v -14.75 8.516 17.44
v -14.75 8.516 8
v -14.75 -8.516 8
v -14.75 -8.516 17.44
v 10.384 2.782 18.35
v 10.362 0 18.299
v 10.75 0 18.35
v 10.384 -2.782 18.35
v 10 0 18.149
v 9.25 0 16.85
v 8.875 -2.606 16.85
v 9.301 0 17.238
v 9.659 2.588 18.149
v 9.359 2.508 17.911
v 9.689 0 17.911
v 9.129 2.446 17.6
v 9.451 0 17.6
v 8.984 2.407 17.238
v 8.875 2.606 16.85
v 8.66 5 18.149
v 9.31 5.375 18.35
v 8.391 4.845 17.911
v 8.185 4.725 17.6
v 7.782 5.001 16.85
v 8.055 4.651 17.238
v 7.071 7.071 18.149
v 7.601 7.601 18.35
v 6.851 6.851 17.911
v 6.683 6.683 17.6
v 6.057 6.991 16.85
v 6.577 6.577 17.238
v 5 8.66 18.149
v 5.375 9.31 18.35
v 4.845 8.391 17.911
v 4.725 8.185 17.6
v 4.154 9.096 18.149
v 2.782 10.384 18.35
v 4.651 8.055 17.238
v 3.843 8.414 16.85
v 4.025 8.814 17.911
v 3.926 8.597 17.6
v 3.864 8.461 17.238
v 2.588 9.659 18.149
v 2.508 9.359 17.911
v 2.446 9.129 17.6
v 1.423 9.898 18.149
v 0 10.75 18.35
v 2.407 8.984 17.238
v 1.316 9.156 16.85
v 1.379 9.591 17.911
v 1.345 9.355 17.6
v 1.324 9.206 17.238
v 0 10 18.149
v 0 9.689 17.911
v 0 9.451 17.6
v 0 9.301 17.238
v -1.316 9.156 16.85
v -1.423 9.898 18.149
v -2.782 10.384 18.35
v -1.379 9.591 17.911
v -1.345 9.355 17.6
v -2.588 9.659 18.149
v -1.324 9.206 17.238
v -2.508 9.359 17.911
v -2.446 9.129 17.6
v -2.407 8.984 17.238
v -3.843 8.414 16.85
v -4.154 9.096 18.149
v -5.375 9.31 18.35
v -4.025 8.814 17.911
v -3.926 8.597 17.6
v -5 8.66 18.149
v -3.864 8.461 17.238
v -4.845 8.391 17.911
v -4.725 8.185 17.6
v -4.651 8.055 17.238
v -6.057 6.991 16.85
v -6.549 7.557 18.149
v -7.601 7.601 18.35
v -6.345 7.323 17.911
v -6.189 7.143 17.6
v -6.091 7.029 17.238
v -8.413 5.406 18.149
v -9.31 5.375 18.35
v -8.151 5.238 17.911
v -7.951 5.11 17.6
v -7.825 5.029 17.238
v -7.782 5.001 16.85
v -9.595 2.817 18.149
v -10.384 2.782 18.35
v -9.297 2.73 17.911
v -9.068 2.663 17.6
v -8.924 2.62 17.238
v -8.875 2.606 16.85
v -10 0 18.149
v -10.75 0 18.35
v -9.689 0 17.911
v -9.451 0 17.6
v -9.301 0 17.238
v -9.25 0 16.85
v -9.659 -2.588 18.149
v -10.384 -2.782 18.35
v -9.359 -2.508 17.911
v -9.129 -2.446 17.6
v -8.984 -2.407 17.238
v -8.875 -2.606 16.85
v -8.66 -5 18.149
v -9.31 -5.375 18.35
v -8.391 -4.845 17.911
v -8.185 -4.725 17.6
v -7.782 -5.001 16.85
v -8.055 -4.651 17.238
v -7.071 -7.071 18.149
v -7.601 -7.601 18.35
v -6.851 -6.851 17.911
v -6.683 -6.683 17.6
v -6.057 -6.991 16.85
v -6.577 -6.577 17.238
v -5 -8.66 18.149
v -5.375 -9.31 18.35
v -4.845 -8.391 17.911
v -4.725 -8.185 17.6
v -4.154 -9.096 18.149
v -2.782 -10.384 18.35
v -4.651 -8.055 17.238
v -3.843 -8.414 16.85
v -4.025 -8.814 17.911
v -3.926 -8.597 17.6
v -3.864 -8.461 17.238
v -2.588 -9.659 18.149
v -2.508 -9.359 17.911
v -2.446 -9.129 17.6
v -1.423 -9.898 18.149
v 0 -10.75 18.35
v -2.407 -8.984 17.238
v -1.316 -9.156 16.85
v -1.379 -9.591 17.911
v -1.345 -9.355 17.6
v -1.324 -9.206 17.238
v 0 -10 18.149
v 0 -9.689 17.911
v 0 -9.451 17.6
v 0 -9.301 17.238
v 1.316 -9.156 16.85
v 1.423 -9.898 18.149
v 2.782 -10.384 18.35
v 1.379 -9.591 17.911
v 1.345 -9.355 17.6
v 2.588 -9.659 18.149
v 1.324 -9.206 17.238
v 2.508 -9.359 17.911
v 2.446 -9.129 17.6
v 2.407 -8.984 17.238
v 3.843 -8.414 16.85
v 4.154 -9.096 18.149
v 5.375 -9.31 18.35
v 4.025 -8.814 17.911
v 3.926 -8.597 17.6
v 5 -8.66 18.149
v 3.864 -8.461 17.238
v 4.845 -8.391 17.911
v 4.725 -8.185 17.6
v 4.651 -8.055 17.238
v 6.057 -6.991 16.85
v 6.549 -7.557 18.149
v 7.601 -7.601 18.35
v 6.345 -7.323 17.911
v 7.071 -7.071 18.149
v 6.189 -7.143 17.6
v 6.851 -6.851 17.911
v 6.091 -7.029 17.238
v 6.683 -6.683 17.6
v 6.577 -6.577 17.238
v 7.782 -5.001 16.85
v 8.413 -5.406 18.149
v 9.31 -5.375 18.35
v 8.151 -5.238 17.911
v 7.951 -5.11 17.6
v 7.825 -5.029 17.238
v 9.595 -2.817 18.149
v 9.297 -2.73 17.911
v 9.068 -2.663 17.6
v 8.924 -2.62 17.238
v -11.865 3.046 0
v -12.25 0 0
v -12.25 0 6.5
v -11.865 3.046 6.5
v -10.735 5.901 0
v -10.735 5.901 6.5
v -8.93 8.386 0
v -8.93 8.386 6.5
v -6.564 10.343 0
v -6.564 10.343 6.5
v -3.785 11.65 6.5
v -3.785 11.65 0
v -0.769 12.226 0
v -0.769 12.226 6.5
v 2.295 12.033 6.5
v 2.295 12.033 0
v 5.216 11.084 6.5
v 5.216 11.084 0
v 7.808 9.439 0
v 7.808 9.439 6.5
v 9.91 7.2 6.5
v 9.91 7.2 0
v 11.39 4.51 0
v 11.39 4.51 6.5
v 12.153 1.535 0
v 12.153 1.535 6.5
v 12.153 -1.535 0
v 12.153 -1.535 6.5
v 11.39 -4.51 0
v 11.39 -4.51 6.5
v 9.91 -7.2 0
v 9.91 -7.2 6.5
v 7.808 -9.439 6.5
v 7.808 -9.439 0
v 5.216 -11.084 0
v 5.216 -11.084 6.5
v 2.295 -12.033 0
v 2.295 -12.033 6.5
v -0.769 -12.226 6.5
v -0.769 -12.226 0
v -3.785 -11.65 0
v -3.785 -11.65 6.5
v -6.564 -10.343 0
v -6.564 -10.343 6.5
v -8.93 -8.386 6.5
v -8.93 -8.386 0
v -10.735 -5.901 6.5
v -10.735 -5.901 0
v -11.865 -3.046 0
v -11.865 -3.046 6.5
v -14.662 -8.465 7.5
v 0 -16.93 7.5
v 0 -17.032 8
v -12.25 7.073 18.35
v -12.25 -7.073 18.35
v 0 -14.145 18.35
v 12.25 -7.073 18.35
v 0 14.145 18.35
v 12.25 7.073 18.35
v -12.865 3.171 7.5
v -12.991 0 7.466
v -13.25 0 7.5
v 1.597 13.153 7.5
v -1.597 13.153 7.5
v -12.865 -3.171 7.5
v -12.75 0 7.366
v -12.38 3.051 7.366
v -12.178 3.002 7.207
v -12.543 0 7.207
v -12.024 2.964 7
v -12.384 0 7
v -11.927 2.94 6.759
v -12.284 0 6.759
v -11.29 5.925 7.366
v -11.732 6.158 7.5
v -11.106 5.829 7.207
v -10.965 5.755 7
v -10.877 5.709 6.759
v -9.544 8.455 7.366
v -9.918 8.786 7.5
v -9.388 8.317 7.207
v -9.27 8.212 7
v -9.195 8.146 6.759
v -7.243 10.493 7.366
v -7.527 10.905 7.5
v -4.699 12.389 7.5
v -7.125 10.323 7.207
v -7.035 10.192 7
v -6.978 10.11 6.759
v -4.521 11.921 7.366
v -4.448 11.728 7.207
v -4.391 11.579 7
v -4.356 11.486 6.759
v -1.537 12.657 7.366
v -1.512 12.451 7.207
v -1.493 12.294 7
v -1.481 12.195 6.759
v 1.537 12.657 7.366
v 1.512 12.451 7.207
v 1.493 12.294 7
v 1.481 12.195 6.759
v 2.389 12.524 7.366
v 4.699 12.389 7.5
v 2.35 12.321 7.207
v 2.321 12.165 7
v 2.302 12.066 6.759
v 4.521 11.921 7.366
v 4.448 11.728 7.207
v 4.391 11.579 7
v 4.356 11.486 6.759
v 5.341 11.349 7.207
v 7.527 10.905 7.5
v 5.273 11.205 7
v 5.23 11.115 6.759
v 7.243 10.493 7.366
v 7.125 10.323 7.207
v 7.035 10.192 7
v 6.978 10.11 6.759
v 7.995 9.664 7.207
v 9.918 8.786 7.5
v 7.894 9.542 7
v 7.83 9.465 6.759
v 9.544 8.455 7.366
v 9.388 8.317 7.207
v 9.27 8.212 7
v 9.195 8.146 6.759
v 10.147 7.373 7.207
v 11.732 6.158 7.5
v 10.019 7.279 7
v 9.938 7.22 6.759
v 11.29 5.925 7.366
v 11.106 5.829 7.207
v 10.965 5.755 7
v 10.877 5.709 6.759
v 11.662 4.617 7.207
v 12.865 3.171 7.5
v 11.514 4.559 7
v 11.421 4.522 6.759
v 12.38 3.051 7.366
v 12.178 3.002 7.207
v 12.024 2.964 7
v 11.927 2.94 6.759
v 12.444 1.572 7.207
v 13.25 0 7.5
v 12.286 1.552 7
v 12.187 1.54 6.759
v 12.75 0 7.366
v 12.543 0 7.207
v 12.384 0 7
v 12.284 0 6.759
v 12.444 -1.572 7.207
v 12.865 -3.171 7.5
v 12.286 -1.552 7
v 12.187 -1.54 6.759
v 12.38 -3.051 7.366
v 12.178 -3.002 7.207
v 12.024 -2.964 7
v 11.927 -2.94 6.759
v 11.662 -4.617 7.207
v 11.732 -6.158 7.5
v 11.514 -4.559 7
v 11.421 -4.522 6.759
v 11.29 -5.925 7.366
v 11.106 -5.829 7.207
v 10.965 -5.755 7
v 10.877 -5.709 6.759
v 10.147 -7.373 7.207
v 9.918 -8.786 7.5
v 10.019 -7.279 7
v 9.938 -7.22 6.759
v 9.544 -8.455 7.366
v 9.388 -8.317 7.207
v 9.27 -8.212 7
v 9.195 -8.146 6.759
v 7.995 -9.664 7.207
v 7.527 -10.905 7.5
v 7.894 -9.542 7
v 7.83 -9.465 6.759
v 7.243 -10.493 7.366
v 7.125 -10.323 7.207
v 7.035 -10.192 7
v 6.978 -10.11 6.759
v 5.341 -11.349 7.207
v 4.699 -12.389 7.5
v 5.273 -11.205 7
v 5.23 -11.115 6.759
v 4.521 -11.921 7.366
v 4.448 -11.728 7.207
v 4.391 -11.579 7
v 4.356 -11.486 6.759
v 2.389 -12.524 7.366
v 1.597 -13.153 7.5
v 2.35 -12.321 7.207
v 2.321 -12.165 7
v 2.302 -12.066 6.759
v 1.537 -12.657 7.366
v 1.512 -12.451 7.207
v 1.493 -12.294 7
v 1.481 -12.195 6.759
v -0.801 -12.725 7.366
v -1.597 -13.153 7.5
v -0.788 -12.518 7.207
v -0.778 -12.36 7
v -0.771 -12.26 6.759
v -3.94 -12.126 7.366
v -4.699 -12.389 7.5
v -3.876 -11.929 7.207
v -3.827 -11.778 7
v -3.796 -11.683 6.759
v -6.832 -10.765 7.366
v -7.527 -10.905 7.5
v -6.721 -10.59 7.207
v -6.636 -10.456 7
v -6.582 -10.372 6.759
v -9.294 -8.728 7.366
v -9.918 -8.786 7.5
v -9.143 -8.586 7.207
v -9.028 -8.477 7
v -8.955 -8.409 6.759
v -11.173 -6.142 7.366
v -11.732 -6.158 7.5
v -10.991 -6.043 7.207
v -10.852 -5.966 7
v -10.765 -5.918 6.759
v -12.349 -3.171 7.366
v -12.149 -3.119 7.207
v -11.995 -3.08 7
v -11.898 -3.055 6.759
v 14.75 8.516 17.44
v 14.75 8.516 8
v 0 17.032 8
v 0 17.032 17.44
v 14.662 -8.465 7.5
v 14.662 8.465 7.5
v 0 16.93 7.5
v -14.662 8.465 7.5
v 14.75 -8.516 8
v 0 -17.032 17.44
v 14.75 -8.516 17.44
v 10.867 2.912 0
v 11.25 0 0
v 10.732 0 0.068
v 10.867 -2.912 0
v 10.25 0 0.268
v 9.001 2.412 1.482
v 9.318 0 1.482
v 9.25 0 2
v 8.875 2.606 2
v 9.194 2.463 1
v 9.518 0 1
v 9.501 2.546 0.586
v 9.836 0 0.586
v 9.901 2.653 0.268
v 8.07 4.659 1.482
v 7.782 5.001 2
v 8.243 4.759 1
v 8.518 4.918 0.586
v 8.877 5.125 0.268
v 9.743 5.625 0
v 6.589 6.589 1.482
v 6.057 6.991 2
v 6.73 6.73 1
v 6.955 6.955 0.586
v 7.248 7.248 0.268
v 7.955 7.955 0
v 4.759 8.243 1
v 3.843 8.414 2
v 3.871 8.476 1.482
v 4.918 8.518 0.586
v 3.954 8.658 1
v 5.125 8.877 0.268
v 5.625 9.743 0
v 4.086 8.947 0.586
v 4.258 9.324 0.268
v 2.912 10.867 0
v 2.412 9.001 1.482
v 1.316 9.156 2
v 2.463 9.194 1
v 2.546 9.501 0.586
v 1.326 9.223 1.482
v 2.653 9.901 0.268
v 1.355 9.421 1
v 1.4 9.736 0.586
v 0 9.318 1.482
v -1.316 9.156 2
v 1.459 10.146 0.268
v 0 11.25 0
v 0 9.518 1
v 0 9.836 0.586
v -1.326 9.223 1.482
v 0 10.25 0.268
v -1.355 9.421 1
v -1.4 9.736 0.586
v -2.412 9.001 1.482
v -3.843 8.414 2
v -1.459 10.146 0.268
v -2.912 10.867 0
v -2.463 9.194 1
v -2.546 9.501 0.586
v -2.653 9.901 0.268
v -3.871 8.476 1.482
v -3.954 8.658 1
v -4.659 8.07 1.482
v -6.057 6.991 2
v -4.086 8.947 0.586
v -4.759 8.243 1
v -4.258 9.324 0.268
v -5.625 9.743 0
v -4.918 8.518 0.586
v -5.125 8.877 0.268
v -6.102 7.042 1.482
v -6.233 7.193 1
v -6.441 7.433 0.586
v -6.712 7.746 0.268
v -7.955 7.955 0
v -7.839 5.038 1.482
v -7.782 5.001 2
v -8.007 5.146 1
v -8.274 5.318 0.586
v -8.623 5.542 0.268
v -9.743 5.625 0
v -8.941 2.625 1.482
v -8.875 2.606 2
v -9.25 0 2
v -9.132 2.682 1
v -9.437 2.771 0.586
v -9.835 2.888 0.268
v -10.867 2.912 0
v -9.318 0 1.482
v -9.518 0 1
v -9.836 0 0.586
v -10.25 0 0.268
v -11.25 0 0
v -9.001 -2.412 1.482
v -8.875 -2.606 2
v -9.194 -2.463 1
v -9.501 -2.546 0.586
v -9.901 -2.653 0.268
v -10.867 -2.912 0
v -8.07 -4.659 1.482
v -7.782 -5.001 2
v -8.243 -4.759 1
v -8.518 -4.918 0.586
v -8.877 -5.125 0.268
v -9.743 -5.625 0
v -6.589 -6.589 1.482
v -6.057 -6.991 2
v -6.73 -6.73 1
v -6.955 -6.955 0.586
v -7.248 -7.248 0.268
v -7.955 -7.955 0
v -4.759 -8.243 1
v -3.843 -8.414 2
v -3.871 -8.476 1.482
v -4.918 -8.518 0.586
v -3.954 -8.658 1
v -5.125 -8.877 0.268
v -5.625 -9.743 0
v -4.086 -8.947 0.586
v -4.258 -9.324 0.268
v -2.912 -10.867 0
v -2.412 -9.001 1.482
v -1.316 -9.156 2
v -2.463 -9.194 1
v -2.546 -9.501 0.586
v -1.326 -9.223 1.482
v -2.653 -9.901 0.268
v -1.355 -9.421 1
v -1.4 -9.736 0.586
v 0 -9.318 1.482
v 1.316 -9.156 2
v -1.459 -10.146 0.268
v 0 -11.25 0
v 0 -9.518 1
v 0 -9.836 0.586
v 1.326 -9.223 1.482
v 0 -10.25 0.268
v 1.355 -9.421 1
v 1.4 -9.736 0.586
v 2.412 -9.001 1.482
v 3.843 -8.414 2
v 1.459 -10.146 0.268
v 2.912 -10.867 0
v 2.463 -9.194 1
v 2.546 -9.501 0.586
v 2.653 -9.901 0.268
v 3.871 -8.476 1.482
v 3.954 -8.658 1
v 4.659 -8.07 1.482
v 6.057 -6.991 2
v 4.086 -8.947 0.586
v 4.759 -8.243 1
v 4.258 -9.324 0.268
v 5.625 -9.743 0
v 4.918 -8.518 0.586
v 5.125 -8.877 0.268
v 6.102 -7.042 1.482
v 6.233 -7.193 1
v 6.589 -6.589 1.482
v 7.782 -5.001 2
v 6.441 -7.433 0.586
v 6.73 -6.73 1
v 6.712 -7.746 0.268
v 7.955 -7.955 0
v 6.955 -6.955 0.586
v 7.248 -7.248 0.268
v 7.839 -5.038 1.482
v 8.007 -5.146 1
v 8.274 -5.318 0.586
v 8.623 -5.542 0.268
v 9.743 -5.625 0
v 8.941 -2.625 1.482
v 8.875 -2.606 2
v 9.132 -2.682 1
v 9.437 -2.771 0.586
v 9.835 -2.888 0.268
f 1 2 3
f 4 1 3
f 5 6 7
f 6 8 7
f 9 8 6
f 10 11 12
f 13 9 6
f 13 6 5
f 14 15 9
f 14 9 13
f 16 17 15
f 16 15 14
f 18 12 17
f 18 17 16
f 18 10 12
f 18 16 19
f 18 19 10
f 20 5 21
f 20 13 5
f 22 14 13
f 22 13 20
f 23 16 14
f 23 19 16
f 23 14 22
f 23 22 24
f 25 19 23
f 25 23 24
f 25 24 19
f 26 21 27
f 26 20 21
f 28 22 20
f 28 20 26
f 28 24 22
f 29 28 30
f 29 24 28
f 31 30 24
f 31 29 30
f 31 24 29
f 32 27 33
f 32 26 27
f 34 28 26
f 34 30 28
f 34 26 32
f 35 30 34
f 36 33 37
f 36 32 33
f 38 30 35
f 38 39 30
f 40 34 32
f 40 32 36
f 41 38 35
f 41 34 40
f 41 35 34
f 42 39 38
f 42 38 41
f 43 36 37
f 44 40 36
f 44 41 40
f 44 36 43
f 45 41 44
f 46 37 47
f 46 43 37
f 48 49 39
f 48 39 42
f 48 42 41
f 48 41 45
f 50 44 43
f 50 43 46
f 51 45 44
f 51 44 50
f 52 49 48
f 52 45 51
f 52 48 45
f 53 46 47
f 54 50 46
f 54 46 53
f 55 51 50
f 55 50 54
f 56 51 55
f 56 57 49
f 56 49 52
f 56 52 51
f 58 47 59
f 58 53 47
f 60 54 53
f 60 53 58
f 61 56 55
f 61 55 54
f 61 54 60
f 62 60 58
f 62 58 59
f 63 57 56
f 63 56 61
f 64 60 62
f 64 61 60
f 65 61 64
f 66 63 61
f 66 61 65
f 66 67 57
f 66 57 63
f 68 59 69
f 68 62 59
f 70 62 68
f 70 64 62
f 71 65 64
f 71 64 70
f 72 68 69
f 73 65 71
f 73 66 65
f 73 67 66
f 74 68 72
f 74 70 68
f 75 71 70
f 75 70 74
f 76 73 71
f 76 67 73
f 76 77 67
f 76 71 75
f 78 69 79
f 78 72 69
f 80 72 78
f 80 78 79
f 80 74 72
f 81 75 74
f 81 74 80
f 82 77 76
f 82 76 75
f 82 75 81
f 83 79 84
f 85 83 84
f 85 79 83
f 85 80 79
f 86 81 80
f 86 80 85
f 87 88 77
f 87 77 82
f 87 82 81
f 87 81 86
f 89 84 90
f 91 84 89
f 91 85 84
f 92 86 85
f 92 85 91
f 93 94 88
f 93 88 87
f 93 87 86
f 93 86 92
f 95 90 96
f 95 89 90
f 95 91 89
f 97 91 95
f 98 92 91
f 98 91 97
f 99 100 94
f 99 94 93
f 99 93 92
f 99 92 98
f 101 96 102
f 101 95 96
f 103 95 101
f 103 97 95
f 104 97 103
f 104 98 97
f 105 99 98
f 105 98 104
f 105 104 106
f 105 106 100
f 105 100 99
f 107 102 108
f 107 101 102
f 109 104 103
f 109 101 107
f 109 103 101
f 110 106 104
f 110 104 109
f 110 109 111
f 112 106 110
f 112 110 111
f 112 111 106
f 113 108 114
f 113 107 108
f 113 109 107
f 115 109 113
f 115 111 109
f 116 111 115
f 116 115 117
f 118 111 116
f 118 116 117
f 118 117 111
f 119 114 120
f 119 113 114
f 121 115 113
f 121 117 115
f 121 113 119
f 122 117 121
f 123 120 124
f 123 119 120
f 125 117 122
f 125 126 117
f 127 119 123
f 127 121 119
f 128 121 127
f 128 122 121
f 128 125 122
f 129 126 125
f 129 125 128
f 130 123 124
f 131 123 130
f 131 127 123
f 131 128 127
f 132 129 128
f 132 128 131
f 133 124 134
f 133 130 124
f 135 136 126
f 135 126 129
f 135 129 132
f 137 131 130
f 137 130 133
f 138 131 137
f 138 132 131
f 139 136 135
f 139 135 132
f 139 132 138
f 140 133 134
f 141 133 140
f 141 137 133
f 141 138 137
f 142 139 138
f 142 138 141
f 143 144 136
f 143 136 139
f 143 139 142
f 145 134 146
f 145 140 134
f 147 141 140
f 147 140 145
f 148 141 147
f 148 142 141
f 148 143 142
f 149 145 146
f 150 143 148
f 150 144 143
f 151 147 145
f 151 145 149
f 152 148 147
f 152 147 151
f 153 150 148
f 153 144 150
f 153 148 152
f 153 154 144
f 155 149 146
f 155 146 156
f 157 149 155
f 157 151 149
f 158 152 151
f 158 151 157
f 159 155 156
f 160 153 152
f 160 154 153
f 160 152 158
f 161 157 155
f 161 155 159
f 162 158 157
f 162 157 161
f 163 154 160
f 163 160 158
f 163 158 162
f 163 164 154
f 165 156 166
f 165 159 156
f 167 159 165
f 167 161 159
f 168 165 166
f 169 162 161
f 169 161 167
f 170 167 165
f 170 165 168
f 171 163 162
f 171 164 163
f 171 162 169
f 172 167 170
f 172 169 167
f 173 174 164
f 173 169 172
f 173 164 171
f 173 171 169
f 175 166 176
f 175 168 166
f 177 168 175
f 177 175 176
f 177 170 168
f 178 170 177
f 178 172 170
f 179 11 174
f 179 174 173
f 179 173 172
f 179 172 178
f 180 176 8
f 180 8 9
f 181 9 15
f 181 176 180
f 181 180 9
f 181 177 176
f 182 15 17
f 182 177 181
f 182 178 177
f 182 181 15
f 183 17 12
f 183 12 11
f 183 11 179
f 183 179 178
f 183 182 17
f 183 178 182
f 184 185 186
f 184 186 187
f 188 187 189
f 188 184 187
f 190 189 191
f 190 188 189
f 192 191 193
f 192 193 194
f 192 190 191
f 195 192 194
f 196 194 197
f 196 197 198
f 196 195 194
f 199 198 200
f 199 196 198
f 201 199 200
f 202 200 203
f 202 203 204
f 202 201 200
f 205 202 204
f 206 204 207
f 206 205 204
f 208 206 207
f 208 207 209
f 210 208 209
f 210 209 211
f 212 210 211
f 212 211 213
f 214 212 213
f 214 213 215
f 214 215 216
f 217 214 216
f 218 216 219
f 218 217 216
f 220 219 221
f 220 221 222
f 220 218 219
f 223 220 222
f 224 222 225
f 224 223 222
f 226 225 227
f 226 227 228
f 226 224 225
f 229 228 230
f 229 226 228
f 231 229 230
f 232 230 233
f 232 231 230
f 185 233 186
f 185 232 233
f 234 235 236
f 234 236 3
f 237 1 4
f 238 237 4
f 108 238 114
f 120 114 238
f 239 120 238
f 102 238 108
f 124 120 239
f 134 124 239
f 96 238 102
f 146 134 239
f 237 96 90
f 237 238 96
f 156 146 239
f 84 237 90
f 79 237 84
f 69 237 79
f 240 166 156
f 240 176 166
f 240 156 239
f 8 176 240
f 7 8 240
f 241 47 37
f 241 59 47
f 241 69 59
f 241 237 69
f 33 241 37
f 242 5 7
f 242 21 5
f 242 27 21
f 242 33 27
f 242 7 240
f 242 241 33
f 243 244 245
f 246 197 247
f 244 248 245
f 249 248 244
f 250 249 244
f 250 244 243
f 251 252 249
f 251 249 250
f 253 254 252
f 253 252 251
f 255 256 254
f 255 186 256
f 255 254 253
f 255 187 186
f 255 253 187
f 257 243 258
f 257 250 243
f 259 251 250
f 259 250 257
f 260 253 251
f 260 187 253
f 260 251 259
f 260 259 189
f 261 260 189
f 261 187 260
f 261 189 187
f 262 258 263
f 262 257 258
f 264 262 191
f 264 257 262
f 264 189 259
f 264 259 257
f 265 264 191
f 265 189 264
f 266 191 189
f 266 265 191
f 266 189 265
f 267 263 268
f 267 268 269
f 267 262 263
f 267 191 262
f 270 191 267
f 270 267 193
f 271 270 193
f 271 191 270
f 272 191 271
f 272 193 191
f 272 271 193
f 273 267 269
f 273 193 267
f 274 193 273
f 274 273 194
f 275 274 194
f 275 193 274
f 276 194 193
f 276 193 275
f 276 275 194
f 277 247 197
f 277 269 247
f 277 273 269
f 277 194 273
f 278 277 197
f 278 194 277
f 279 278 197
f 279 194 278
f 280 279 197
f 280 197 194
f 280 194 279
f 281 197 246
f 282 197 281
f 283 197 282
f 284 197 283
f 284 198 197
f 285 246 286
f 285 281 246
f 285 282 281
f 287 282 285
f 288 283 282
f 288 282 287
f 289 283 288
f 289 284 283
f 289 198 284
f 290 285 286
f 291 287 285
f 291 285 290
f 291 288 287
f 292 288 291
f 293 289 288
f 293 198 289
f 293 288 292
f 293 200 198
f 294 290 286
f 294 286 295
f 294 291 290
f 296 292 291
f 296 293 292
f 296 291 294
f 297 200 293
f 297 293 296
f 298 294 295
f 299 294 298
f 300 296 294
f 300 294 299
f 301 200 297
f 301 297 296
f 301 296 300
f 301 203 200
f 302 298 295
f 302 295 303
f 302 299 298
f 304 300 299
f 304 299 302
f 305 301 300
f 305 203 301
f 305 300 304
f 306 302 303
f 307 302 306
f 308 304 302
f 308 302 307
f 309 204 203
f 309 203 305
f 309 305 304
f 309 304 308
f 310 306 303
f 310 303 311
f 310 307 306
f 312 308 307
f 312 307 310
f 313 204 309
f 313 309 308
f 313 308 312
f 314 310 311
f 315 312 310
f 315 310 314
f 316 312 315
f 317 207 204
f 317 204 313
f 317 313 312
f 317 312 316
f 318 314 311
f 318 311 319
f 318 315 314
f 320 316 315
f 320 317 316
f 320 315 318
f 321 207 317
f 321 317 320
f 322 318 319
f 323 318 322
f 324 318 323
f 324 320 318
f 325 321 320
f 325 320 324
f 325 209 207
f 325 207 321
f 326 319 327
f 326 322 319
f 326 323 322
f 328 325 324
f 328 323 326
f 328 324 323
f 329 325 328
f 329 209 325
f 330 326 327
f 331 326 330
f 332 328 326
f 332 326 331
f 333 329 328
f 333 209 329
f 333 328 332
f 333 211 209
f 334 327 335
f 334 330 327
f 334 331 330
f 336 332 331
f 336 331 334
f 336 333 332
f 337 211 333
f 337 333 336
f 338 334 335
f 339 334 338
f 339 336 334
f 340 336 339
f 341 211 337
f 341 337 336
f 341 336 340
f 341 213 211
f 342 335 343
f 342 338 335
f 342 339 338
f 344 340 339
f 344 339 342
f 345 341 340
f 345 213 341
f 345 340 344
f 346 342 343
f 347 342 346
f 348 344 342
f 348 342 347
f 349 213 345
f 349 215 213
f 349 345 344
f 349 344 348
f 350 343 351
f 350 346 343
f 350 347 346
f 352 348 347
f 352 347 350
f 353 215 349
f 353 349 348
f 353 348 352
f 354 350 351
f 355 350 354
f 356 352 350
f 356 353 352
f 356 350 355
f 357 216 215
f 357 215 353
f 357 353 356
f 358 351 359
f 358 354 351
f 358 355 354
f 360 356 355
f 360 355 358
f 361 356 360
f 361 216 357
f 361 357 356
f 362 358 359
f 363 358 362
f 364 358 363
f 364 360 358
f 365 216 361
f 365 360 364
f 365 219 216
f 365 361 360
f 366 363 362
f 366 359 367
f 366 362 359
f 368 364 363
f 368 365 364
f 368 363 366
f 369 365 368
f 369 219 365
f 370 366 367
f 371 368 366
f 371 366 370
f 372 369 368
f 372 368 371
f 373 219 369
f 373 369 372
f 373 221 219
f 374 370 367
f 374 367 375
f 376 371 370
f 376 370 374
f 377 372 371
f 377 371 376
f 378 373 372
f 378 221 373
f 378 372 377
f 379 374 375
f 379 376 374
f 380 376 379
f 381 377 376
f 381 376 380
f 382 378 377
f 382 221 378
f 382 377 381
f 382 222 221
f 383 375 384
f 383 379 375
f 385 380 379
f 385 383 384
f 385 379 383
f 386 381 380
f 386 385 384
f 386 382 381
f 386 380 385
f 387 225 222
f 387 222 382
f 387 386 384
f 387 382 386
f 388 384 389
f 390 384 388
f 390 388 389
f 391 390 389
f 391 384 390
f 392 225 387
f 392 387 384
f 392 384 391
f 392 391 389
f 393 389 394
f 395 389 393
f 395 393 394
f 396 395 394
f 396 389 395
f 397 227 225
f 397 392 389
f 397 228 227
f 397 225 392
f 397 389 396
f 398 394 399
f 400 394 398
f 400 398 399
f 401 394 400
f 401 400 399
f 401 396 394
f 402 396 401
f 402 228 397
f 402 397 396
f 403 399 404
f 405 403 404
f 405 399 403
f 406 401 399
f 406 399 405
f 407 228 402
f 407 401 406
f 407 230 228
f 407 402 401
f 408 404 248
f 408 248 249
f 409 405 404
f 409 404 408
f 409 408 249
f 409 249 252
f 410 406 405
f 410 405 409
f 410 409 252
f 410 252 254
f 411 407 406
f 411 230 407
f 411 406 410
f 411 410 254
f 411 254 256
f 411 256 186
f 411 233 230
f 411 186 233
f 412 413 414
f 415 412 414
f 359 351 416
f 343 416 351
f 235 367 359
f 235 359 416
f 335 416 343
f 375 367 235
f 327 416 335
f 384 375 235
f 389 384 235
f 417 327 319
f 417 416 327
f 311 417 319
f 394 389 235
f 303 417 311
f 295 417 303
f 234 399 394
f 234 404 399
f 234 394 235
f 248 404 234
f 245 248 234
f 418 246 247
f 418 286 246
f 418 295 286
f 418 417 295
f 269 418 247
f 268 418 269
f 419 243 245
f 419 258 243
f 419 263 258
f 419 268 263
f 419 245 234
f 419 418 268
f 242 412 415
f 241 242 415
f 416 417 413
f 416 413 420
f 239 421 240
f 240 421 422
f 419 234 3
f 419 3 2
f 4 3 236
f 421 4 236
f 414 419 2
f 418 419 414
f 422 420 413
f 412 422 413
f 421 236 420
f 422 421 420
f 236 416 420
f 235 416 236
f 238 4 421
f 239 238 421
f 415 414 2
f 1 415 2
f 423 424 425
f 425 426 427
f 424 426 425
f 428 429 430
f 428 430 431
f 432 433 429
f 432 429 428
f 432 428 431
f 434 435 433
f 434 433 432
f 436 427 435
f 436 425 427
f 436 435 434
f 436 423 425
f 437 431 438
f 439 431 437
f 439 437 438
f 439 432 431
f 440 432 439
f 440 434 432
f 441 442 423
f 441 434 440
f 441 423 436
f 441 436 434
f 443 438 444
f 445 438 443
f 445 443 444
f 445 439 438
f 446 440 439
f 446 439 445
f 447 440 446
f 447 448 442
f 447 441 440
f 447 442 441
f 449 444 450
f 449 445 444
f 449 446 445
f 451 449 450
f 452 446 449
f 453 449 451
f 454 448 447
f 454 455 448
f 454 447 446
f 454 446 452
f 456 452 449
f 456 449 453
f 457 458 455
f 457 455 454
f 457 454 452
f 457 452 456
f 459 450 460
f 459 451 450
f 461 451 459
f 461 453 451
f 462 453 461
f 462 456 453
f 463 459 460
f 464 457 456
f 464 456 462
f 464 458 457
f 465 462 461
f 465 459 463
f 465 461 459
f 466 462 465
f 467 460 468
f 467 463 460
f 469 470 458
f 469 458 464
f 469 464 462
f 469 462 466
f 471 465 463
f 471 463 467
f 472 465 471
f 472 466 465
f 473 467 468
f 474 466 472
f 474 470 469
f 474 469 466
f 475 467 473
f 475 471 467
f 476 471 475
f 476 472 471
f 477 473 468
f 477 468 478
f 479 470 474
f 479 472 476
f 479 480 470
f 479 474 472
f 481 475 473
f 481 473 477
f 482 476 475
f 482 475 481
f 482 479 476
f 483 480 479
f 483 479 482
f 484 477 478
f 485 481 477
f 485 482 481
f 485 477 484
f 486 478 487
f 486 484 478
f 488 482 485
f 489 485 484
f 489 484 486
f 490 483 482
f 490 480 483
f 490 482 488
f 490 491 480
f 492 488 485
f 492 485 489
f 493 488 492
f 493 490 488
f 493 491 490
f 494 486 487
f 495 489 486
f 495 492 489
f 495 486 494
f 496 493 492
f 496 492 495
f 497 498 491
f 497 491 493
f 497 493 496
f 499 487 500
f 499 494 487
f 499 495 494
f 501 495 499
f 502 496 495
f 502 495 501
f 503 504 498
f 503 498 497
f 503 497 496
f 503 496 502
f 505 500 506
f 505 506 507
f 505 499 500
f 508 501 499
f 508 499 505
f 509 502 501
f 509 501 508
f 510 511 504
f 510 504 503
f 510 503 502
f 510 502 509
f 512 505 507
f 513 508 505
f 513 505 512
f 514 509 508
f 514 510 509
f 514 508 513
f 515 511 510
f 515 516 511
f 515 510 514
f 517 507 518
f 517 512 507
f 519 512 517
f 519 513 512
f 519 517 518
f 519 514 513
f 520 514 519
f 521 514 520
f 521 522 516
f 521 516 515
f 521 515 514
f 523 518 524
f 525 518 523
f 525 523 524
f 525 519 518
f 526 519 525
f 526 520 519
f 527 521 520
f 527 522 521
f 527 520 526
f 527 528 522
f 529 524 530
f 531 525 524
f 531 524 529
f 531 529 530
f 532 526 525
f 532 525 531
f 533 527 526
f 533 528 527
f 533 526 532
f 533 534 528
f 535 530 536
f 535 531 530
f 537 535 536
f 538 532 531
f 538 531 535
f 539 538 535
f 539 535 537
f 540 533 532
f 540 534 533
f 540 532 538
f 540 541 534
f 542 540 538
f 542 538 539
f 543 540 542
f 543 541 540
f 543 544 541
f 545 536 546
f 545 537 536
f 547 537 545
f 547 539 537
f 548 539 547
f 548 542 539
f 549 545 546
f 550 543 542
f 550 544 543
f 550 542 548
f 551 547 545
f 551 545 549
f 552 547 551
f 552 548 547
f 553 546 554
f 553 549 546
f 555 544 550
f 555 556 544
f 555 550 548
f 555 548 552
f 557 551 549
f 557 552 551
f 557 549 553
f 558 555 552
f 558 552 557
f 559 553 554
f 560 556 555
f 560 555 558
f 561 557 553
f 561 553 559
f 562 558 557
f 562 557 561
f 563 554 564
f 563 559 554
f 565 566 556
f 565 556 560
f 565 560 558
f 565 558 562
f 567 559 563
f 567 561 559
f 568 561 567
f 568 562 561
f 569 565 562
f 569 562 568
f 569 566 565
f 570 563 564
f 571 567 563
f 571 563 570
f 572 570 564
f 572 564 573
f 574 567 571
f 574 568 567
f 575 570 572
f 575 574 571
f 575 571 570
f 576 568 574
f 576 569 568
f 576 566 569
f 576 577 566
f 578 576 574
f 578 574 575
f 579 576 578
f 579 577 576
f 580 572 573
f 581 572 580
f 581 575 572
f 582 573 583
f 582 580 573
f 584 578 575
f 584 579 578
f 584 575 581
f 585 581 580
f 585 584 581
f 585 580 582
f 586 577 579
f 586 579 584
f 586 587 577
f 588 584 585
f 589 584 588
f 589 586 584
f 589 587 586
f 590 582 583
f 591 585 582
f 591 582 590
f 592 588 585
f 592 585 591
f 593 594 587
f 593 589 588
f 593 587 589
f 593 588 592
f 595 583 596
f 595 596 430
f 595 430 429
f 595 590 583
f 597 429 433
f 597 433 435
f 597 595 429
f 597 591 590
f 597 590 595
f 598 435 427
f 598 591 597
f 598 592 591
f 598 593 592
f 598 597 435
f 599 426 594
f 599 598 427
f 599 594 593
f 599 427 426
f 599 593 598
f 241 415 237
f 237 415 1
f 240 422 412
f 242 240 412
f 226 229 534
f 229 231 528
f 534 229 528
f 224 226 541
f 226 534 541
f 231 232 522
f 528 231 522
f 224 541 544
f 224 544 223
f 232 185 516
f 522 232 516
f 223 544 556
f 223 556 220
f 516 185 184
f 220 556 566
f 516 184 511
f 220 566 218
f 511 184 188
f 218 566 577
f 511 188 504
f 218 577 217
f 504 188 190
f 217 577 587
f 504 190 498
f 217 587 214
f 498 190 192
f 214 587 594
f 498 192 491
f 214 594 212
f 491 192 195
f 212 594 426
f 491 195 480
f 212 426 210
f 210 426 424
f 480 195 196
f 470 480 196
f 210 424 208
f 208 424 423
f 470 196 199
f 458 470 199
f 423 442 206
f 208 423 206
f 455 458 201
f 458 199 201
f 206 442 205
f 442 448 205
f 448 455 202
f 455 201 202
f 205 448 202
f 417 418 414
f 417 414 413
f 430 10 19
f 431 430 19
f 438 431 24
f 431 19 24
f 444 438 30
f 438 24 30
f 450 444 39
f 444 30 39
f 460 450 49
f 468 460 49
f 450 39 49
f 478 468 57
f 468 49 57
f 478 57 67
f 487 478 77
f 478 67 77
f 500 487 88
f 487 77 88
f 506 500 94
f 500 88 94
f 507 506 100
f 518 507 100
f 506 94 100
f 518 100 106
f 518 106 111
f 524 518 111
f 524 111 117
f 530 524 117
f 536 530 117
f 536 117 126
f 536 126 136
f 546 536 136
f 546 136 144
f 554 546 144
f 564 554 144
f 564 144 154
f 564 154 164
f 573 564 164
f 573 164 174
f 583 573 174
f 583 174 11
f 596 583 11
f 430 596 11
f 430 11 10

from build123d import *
from OCP.BRepFilletAPI import BRepFilletAPI_MakeChamfer

# Parameters (mm, degrees)
RESSALTO_EXTRUS_O1_DEPTH = 18.35
ESBO_O2_R                = 9.25
CORTE_EXTRUS_O1_DEPTH    = 30.058016679
ESBO_O3_R                = 19.09752109
ESBO_O3_R_2              = 12.25
CORTE_EXTRUS_O2_DEPTH    = 7.5
FILETE1_R                = 2
CHANFRO1_SIZE            = 0.5
CHANFRO1_SIZE2           = 0.08816349
FILETE2_R                = 1
CHANFRO3_SIZE            = 2.5
CHANFRO3_SIZE2           = 0.909925586
FILETE3_R                = 1.5


with BuildPart() as part:
    # Esboço1 → Ressalto-extrusão1 (new body)
    with BuildSketch(Plane.XY):
        Polygon((0, -17.031832941), (14.75, -8.515916471), (14.75, 8.515916471), (0, 17.031832941), (-14.75, 8.515916471), (-14.75, -8.515916471), align=None)
    extrude(amount=RESSALTO_EXTRUS_O1_DEPTH)

    # Esboço2 → Corte-extrusão1 (cut, through all)
    with BuildSketch(Plane.XY.offset(18.35)):
        Circle(ESBO_O2_R)
    extrude(amount=-CORTE_EXTRUS_O1_DEPTH, mode=Mode.SUBTRACT)

    # Esboço3 → Corte-extrusão2 (cut)
    with BuildSketch(Plane(origin=(0, 0, 0), x_dir=(-1, 0, 0), z_dir=(0, 0, -1))):
        Circle(ESBO_O3_R)
        Circle(ESBO_O3_R_2, mode=Mode.SUBTRACT)
    extrude(amount=-CORTE_EXTRUS_O2_DEPTH, mode=Mode.SUBTRACT)

    # Filete1
    filete1_edges = [part.edges().sort_by_distance(p)[0] for p in [
        (-9.25, 0, 0),
    ]]
    fillet(filete1_edges, radius=FILETE1_R)

    # Chanfro1: one chamfer whose edges measure the first distance from different faces: ONE call of the kernel's chamfer builder (chamfer() names one face for all edges)
    chanfro1_edges_1 = [part.edges().sort_by_distance(p)[0] for p in [
        (-14.75, 0, 7.5),
    ]]
    chanfro1_side_1 = [part.faces().sort_by_distance(p)[0] for p in [
        (-14.75, 0, 12.925),
    ]]
    chanfro1_edges_2 = [part.edges().sort_by_distance(p)[0] for p in [
        (7.375, -12.773874706, 7.5),
    ]]
    chanfro1_side_2 = [part.faces().sort_by_distance(p)[0] for p in [
        (7.375, -12.773874706, 12.925),
    ]]
    chanfro1_edges_3 = [part.edges().sort_by_distance(p)[0] for p in [
        (-7.375, -12.773874706, 7.5),
    ]]
    chanfro1_side_3 = [part.faces().sort_by_distance(p)[0] for p in [
        (-7.375, -12.773874706, 12.925),
    ]]
    chanfro1_edges_4 = [part.edges().sort_by_distance(p)[0] for p in [
        (-7.375, 12.773874706, 7.5),
    ]]
    chanfro1_side_4 = [part.faces().sort_by_distance(p)[0] for p in [
        (-7.375, 12.773874706, 12.925),
    ]]
    chanfro1_edges_5 = [part.edges().sort_by_distance(p)[0] for p in [
        (7.375, 12.773874706, 7.5),
    ]]
    chanfro1_side_5 = [part.faces().sort_by_distance(p)[0] for p in [
        (7.375, 12.773874706, 12.925),
    ]]
    chanfro1_edges_6 = [part.edges().sort_by_distance(p)[0] for p in [
        (14.75, 0, 7.5),
    ]]
    chanfro1_side_6 = [part.faces().sort_by_distance(p)[0] for p in [
        (14.75, 0, 12.925),
    ]]
    chanfro1 = BRepFilletAPI_MakeChamfer(part.part.solid().wrapped)
    for e in chanfro1_edges_1:
        chanfro1.Add(CHANFRO1_SIZE, CHANFRO1_SIZE2, e.wrapped, chanfro1_side_1[0].wrapped)  # the first distance lies on this face
    for e in chanfro1_edges_2:
        chanfro1.Add(CHANFRO1_SIZE, CHANFRO1_SIZE2, e.wrapped, chanfro1_side_2[0].wrapped)  # the first distance lies on this face
    for e in chanfro1_edges_3:
        chanfro1.Add(CHANFRO1_SIZE, CHANFRO1_SIZE2, e.wrapped, chanfro1_side_3[0].wrapped)  # the first distance lies on this face
    for e in chanfro1_edges_4:
        chanfro1.Add(CHANFRO1_SIZE, CHANFRO1_SIZE2, e.wrapped, chanfro1_side_4[0].wrapped)  # the first distance lies on this face
    for e in chanfro1_edges_5:
        chanfro1.Add(CHANFRO1_SIZE, CHANFRO1_SIZE2, e.wrapped, chanfro1_side_5[0].wrapped)  # the first distance lies on this face
    for e in chanfro1_edges_6:
        chanfro1.Add(CHANFRO1_SIZE, CHANFRO1_SIZE2, e.wrapped, chanfro1_side_6[0].wrapped)  # the first distance lies on this face
    add(Compound.cast(chanfro1.Shape()), mode=Mode.REPLACE)

    # Filete2
    filete2_edges = [part.edges().sort_by_distance(p)[0] for p in [
        (12.25, 0, 7.5),
    ]]
    fillet(filete2_edges, radius=FILETE2_R)

    # Chanfro3
    chanfro3_edges = [part.edges().sort_by_distance(p)[0] for p in [
        (14.75, 0, 18.35),
        (7.375, 12.773874706, 18.35),
        (-7.375, 12.773874706, 18.35),
        (-14.75, 0, 18.35),
        (-7.375, -12.773874706, 18.35),
        (7.375, -12.773874706, 18.35),
    ]]
    chanfro3_side = [part.faces().sort_by_distance(p)[0] for p in [
        (7.149690028, -12.383626387, 18.35),
    ]]
    chamfer(chanfro3_edges, length=CHANFRO3_SIZE, length2=CHANFRO3_SIZE2, reference=chanfro3_side[0])

    # Filete3
    filete3_edges = [part.edges().sort_by_distance(p)[0] for p in [
        (-9.25, 0, 18.35),
    ]]
    fillet(filete3_edges, radius=FILETE3_R)


solid = part.part
